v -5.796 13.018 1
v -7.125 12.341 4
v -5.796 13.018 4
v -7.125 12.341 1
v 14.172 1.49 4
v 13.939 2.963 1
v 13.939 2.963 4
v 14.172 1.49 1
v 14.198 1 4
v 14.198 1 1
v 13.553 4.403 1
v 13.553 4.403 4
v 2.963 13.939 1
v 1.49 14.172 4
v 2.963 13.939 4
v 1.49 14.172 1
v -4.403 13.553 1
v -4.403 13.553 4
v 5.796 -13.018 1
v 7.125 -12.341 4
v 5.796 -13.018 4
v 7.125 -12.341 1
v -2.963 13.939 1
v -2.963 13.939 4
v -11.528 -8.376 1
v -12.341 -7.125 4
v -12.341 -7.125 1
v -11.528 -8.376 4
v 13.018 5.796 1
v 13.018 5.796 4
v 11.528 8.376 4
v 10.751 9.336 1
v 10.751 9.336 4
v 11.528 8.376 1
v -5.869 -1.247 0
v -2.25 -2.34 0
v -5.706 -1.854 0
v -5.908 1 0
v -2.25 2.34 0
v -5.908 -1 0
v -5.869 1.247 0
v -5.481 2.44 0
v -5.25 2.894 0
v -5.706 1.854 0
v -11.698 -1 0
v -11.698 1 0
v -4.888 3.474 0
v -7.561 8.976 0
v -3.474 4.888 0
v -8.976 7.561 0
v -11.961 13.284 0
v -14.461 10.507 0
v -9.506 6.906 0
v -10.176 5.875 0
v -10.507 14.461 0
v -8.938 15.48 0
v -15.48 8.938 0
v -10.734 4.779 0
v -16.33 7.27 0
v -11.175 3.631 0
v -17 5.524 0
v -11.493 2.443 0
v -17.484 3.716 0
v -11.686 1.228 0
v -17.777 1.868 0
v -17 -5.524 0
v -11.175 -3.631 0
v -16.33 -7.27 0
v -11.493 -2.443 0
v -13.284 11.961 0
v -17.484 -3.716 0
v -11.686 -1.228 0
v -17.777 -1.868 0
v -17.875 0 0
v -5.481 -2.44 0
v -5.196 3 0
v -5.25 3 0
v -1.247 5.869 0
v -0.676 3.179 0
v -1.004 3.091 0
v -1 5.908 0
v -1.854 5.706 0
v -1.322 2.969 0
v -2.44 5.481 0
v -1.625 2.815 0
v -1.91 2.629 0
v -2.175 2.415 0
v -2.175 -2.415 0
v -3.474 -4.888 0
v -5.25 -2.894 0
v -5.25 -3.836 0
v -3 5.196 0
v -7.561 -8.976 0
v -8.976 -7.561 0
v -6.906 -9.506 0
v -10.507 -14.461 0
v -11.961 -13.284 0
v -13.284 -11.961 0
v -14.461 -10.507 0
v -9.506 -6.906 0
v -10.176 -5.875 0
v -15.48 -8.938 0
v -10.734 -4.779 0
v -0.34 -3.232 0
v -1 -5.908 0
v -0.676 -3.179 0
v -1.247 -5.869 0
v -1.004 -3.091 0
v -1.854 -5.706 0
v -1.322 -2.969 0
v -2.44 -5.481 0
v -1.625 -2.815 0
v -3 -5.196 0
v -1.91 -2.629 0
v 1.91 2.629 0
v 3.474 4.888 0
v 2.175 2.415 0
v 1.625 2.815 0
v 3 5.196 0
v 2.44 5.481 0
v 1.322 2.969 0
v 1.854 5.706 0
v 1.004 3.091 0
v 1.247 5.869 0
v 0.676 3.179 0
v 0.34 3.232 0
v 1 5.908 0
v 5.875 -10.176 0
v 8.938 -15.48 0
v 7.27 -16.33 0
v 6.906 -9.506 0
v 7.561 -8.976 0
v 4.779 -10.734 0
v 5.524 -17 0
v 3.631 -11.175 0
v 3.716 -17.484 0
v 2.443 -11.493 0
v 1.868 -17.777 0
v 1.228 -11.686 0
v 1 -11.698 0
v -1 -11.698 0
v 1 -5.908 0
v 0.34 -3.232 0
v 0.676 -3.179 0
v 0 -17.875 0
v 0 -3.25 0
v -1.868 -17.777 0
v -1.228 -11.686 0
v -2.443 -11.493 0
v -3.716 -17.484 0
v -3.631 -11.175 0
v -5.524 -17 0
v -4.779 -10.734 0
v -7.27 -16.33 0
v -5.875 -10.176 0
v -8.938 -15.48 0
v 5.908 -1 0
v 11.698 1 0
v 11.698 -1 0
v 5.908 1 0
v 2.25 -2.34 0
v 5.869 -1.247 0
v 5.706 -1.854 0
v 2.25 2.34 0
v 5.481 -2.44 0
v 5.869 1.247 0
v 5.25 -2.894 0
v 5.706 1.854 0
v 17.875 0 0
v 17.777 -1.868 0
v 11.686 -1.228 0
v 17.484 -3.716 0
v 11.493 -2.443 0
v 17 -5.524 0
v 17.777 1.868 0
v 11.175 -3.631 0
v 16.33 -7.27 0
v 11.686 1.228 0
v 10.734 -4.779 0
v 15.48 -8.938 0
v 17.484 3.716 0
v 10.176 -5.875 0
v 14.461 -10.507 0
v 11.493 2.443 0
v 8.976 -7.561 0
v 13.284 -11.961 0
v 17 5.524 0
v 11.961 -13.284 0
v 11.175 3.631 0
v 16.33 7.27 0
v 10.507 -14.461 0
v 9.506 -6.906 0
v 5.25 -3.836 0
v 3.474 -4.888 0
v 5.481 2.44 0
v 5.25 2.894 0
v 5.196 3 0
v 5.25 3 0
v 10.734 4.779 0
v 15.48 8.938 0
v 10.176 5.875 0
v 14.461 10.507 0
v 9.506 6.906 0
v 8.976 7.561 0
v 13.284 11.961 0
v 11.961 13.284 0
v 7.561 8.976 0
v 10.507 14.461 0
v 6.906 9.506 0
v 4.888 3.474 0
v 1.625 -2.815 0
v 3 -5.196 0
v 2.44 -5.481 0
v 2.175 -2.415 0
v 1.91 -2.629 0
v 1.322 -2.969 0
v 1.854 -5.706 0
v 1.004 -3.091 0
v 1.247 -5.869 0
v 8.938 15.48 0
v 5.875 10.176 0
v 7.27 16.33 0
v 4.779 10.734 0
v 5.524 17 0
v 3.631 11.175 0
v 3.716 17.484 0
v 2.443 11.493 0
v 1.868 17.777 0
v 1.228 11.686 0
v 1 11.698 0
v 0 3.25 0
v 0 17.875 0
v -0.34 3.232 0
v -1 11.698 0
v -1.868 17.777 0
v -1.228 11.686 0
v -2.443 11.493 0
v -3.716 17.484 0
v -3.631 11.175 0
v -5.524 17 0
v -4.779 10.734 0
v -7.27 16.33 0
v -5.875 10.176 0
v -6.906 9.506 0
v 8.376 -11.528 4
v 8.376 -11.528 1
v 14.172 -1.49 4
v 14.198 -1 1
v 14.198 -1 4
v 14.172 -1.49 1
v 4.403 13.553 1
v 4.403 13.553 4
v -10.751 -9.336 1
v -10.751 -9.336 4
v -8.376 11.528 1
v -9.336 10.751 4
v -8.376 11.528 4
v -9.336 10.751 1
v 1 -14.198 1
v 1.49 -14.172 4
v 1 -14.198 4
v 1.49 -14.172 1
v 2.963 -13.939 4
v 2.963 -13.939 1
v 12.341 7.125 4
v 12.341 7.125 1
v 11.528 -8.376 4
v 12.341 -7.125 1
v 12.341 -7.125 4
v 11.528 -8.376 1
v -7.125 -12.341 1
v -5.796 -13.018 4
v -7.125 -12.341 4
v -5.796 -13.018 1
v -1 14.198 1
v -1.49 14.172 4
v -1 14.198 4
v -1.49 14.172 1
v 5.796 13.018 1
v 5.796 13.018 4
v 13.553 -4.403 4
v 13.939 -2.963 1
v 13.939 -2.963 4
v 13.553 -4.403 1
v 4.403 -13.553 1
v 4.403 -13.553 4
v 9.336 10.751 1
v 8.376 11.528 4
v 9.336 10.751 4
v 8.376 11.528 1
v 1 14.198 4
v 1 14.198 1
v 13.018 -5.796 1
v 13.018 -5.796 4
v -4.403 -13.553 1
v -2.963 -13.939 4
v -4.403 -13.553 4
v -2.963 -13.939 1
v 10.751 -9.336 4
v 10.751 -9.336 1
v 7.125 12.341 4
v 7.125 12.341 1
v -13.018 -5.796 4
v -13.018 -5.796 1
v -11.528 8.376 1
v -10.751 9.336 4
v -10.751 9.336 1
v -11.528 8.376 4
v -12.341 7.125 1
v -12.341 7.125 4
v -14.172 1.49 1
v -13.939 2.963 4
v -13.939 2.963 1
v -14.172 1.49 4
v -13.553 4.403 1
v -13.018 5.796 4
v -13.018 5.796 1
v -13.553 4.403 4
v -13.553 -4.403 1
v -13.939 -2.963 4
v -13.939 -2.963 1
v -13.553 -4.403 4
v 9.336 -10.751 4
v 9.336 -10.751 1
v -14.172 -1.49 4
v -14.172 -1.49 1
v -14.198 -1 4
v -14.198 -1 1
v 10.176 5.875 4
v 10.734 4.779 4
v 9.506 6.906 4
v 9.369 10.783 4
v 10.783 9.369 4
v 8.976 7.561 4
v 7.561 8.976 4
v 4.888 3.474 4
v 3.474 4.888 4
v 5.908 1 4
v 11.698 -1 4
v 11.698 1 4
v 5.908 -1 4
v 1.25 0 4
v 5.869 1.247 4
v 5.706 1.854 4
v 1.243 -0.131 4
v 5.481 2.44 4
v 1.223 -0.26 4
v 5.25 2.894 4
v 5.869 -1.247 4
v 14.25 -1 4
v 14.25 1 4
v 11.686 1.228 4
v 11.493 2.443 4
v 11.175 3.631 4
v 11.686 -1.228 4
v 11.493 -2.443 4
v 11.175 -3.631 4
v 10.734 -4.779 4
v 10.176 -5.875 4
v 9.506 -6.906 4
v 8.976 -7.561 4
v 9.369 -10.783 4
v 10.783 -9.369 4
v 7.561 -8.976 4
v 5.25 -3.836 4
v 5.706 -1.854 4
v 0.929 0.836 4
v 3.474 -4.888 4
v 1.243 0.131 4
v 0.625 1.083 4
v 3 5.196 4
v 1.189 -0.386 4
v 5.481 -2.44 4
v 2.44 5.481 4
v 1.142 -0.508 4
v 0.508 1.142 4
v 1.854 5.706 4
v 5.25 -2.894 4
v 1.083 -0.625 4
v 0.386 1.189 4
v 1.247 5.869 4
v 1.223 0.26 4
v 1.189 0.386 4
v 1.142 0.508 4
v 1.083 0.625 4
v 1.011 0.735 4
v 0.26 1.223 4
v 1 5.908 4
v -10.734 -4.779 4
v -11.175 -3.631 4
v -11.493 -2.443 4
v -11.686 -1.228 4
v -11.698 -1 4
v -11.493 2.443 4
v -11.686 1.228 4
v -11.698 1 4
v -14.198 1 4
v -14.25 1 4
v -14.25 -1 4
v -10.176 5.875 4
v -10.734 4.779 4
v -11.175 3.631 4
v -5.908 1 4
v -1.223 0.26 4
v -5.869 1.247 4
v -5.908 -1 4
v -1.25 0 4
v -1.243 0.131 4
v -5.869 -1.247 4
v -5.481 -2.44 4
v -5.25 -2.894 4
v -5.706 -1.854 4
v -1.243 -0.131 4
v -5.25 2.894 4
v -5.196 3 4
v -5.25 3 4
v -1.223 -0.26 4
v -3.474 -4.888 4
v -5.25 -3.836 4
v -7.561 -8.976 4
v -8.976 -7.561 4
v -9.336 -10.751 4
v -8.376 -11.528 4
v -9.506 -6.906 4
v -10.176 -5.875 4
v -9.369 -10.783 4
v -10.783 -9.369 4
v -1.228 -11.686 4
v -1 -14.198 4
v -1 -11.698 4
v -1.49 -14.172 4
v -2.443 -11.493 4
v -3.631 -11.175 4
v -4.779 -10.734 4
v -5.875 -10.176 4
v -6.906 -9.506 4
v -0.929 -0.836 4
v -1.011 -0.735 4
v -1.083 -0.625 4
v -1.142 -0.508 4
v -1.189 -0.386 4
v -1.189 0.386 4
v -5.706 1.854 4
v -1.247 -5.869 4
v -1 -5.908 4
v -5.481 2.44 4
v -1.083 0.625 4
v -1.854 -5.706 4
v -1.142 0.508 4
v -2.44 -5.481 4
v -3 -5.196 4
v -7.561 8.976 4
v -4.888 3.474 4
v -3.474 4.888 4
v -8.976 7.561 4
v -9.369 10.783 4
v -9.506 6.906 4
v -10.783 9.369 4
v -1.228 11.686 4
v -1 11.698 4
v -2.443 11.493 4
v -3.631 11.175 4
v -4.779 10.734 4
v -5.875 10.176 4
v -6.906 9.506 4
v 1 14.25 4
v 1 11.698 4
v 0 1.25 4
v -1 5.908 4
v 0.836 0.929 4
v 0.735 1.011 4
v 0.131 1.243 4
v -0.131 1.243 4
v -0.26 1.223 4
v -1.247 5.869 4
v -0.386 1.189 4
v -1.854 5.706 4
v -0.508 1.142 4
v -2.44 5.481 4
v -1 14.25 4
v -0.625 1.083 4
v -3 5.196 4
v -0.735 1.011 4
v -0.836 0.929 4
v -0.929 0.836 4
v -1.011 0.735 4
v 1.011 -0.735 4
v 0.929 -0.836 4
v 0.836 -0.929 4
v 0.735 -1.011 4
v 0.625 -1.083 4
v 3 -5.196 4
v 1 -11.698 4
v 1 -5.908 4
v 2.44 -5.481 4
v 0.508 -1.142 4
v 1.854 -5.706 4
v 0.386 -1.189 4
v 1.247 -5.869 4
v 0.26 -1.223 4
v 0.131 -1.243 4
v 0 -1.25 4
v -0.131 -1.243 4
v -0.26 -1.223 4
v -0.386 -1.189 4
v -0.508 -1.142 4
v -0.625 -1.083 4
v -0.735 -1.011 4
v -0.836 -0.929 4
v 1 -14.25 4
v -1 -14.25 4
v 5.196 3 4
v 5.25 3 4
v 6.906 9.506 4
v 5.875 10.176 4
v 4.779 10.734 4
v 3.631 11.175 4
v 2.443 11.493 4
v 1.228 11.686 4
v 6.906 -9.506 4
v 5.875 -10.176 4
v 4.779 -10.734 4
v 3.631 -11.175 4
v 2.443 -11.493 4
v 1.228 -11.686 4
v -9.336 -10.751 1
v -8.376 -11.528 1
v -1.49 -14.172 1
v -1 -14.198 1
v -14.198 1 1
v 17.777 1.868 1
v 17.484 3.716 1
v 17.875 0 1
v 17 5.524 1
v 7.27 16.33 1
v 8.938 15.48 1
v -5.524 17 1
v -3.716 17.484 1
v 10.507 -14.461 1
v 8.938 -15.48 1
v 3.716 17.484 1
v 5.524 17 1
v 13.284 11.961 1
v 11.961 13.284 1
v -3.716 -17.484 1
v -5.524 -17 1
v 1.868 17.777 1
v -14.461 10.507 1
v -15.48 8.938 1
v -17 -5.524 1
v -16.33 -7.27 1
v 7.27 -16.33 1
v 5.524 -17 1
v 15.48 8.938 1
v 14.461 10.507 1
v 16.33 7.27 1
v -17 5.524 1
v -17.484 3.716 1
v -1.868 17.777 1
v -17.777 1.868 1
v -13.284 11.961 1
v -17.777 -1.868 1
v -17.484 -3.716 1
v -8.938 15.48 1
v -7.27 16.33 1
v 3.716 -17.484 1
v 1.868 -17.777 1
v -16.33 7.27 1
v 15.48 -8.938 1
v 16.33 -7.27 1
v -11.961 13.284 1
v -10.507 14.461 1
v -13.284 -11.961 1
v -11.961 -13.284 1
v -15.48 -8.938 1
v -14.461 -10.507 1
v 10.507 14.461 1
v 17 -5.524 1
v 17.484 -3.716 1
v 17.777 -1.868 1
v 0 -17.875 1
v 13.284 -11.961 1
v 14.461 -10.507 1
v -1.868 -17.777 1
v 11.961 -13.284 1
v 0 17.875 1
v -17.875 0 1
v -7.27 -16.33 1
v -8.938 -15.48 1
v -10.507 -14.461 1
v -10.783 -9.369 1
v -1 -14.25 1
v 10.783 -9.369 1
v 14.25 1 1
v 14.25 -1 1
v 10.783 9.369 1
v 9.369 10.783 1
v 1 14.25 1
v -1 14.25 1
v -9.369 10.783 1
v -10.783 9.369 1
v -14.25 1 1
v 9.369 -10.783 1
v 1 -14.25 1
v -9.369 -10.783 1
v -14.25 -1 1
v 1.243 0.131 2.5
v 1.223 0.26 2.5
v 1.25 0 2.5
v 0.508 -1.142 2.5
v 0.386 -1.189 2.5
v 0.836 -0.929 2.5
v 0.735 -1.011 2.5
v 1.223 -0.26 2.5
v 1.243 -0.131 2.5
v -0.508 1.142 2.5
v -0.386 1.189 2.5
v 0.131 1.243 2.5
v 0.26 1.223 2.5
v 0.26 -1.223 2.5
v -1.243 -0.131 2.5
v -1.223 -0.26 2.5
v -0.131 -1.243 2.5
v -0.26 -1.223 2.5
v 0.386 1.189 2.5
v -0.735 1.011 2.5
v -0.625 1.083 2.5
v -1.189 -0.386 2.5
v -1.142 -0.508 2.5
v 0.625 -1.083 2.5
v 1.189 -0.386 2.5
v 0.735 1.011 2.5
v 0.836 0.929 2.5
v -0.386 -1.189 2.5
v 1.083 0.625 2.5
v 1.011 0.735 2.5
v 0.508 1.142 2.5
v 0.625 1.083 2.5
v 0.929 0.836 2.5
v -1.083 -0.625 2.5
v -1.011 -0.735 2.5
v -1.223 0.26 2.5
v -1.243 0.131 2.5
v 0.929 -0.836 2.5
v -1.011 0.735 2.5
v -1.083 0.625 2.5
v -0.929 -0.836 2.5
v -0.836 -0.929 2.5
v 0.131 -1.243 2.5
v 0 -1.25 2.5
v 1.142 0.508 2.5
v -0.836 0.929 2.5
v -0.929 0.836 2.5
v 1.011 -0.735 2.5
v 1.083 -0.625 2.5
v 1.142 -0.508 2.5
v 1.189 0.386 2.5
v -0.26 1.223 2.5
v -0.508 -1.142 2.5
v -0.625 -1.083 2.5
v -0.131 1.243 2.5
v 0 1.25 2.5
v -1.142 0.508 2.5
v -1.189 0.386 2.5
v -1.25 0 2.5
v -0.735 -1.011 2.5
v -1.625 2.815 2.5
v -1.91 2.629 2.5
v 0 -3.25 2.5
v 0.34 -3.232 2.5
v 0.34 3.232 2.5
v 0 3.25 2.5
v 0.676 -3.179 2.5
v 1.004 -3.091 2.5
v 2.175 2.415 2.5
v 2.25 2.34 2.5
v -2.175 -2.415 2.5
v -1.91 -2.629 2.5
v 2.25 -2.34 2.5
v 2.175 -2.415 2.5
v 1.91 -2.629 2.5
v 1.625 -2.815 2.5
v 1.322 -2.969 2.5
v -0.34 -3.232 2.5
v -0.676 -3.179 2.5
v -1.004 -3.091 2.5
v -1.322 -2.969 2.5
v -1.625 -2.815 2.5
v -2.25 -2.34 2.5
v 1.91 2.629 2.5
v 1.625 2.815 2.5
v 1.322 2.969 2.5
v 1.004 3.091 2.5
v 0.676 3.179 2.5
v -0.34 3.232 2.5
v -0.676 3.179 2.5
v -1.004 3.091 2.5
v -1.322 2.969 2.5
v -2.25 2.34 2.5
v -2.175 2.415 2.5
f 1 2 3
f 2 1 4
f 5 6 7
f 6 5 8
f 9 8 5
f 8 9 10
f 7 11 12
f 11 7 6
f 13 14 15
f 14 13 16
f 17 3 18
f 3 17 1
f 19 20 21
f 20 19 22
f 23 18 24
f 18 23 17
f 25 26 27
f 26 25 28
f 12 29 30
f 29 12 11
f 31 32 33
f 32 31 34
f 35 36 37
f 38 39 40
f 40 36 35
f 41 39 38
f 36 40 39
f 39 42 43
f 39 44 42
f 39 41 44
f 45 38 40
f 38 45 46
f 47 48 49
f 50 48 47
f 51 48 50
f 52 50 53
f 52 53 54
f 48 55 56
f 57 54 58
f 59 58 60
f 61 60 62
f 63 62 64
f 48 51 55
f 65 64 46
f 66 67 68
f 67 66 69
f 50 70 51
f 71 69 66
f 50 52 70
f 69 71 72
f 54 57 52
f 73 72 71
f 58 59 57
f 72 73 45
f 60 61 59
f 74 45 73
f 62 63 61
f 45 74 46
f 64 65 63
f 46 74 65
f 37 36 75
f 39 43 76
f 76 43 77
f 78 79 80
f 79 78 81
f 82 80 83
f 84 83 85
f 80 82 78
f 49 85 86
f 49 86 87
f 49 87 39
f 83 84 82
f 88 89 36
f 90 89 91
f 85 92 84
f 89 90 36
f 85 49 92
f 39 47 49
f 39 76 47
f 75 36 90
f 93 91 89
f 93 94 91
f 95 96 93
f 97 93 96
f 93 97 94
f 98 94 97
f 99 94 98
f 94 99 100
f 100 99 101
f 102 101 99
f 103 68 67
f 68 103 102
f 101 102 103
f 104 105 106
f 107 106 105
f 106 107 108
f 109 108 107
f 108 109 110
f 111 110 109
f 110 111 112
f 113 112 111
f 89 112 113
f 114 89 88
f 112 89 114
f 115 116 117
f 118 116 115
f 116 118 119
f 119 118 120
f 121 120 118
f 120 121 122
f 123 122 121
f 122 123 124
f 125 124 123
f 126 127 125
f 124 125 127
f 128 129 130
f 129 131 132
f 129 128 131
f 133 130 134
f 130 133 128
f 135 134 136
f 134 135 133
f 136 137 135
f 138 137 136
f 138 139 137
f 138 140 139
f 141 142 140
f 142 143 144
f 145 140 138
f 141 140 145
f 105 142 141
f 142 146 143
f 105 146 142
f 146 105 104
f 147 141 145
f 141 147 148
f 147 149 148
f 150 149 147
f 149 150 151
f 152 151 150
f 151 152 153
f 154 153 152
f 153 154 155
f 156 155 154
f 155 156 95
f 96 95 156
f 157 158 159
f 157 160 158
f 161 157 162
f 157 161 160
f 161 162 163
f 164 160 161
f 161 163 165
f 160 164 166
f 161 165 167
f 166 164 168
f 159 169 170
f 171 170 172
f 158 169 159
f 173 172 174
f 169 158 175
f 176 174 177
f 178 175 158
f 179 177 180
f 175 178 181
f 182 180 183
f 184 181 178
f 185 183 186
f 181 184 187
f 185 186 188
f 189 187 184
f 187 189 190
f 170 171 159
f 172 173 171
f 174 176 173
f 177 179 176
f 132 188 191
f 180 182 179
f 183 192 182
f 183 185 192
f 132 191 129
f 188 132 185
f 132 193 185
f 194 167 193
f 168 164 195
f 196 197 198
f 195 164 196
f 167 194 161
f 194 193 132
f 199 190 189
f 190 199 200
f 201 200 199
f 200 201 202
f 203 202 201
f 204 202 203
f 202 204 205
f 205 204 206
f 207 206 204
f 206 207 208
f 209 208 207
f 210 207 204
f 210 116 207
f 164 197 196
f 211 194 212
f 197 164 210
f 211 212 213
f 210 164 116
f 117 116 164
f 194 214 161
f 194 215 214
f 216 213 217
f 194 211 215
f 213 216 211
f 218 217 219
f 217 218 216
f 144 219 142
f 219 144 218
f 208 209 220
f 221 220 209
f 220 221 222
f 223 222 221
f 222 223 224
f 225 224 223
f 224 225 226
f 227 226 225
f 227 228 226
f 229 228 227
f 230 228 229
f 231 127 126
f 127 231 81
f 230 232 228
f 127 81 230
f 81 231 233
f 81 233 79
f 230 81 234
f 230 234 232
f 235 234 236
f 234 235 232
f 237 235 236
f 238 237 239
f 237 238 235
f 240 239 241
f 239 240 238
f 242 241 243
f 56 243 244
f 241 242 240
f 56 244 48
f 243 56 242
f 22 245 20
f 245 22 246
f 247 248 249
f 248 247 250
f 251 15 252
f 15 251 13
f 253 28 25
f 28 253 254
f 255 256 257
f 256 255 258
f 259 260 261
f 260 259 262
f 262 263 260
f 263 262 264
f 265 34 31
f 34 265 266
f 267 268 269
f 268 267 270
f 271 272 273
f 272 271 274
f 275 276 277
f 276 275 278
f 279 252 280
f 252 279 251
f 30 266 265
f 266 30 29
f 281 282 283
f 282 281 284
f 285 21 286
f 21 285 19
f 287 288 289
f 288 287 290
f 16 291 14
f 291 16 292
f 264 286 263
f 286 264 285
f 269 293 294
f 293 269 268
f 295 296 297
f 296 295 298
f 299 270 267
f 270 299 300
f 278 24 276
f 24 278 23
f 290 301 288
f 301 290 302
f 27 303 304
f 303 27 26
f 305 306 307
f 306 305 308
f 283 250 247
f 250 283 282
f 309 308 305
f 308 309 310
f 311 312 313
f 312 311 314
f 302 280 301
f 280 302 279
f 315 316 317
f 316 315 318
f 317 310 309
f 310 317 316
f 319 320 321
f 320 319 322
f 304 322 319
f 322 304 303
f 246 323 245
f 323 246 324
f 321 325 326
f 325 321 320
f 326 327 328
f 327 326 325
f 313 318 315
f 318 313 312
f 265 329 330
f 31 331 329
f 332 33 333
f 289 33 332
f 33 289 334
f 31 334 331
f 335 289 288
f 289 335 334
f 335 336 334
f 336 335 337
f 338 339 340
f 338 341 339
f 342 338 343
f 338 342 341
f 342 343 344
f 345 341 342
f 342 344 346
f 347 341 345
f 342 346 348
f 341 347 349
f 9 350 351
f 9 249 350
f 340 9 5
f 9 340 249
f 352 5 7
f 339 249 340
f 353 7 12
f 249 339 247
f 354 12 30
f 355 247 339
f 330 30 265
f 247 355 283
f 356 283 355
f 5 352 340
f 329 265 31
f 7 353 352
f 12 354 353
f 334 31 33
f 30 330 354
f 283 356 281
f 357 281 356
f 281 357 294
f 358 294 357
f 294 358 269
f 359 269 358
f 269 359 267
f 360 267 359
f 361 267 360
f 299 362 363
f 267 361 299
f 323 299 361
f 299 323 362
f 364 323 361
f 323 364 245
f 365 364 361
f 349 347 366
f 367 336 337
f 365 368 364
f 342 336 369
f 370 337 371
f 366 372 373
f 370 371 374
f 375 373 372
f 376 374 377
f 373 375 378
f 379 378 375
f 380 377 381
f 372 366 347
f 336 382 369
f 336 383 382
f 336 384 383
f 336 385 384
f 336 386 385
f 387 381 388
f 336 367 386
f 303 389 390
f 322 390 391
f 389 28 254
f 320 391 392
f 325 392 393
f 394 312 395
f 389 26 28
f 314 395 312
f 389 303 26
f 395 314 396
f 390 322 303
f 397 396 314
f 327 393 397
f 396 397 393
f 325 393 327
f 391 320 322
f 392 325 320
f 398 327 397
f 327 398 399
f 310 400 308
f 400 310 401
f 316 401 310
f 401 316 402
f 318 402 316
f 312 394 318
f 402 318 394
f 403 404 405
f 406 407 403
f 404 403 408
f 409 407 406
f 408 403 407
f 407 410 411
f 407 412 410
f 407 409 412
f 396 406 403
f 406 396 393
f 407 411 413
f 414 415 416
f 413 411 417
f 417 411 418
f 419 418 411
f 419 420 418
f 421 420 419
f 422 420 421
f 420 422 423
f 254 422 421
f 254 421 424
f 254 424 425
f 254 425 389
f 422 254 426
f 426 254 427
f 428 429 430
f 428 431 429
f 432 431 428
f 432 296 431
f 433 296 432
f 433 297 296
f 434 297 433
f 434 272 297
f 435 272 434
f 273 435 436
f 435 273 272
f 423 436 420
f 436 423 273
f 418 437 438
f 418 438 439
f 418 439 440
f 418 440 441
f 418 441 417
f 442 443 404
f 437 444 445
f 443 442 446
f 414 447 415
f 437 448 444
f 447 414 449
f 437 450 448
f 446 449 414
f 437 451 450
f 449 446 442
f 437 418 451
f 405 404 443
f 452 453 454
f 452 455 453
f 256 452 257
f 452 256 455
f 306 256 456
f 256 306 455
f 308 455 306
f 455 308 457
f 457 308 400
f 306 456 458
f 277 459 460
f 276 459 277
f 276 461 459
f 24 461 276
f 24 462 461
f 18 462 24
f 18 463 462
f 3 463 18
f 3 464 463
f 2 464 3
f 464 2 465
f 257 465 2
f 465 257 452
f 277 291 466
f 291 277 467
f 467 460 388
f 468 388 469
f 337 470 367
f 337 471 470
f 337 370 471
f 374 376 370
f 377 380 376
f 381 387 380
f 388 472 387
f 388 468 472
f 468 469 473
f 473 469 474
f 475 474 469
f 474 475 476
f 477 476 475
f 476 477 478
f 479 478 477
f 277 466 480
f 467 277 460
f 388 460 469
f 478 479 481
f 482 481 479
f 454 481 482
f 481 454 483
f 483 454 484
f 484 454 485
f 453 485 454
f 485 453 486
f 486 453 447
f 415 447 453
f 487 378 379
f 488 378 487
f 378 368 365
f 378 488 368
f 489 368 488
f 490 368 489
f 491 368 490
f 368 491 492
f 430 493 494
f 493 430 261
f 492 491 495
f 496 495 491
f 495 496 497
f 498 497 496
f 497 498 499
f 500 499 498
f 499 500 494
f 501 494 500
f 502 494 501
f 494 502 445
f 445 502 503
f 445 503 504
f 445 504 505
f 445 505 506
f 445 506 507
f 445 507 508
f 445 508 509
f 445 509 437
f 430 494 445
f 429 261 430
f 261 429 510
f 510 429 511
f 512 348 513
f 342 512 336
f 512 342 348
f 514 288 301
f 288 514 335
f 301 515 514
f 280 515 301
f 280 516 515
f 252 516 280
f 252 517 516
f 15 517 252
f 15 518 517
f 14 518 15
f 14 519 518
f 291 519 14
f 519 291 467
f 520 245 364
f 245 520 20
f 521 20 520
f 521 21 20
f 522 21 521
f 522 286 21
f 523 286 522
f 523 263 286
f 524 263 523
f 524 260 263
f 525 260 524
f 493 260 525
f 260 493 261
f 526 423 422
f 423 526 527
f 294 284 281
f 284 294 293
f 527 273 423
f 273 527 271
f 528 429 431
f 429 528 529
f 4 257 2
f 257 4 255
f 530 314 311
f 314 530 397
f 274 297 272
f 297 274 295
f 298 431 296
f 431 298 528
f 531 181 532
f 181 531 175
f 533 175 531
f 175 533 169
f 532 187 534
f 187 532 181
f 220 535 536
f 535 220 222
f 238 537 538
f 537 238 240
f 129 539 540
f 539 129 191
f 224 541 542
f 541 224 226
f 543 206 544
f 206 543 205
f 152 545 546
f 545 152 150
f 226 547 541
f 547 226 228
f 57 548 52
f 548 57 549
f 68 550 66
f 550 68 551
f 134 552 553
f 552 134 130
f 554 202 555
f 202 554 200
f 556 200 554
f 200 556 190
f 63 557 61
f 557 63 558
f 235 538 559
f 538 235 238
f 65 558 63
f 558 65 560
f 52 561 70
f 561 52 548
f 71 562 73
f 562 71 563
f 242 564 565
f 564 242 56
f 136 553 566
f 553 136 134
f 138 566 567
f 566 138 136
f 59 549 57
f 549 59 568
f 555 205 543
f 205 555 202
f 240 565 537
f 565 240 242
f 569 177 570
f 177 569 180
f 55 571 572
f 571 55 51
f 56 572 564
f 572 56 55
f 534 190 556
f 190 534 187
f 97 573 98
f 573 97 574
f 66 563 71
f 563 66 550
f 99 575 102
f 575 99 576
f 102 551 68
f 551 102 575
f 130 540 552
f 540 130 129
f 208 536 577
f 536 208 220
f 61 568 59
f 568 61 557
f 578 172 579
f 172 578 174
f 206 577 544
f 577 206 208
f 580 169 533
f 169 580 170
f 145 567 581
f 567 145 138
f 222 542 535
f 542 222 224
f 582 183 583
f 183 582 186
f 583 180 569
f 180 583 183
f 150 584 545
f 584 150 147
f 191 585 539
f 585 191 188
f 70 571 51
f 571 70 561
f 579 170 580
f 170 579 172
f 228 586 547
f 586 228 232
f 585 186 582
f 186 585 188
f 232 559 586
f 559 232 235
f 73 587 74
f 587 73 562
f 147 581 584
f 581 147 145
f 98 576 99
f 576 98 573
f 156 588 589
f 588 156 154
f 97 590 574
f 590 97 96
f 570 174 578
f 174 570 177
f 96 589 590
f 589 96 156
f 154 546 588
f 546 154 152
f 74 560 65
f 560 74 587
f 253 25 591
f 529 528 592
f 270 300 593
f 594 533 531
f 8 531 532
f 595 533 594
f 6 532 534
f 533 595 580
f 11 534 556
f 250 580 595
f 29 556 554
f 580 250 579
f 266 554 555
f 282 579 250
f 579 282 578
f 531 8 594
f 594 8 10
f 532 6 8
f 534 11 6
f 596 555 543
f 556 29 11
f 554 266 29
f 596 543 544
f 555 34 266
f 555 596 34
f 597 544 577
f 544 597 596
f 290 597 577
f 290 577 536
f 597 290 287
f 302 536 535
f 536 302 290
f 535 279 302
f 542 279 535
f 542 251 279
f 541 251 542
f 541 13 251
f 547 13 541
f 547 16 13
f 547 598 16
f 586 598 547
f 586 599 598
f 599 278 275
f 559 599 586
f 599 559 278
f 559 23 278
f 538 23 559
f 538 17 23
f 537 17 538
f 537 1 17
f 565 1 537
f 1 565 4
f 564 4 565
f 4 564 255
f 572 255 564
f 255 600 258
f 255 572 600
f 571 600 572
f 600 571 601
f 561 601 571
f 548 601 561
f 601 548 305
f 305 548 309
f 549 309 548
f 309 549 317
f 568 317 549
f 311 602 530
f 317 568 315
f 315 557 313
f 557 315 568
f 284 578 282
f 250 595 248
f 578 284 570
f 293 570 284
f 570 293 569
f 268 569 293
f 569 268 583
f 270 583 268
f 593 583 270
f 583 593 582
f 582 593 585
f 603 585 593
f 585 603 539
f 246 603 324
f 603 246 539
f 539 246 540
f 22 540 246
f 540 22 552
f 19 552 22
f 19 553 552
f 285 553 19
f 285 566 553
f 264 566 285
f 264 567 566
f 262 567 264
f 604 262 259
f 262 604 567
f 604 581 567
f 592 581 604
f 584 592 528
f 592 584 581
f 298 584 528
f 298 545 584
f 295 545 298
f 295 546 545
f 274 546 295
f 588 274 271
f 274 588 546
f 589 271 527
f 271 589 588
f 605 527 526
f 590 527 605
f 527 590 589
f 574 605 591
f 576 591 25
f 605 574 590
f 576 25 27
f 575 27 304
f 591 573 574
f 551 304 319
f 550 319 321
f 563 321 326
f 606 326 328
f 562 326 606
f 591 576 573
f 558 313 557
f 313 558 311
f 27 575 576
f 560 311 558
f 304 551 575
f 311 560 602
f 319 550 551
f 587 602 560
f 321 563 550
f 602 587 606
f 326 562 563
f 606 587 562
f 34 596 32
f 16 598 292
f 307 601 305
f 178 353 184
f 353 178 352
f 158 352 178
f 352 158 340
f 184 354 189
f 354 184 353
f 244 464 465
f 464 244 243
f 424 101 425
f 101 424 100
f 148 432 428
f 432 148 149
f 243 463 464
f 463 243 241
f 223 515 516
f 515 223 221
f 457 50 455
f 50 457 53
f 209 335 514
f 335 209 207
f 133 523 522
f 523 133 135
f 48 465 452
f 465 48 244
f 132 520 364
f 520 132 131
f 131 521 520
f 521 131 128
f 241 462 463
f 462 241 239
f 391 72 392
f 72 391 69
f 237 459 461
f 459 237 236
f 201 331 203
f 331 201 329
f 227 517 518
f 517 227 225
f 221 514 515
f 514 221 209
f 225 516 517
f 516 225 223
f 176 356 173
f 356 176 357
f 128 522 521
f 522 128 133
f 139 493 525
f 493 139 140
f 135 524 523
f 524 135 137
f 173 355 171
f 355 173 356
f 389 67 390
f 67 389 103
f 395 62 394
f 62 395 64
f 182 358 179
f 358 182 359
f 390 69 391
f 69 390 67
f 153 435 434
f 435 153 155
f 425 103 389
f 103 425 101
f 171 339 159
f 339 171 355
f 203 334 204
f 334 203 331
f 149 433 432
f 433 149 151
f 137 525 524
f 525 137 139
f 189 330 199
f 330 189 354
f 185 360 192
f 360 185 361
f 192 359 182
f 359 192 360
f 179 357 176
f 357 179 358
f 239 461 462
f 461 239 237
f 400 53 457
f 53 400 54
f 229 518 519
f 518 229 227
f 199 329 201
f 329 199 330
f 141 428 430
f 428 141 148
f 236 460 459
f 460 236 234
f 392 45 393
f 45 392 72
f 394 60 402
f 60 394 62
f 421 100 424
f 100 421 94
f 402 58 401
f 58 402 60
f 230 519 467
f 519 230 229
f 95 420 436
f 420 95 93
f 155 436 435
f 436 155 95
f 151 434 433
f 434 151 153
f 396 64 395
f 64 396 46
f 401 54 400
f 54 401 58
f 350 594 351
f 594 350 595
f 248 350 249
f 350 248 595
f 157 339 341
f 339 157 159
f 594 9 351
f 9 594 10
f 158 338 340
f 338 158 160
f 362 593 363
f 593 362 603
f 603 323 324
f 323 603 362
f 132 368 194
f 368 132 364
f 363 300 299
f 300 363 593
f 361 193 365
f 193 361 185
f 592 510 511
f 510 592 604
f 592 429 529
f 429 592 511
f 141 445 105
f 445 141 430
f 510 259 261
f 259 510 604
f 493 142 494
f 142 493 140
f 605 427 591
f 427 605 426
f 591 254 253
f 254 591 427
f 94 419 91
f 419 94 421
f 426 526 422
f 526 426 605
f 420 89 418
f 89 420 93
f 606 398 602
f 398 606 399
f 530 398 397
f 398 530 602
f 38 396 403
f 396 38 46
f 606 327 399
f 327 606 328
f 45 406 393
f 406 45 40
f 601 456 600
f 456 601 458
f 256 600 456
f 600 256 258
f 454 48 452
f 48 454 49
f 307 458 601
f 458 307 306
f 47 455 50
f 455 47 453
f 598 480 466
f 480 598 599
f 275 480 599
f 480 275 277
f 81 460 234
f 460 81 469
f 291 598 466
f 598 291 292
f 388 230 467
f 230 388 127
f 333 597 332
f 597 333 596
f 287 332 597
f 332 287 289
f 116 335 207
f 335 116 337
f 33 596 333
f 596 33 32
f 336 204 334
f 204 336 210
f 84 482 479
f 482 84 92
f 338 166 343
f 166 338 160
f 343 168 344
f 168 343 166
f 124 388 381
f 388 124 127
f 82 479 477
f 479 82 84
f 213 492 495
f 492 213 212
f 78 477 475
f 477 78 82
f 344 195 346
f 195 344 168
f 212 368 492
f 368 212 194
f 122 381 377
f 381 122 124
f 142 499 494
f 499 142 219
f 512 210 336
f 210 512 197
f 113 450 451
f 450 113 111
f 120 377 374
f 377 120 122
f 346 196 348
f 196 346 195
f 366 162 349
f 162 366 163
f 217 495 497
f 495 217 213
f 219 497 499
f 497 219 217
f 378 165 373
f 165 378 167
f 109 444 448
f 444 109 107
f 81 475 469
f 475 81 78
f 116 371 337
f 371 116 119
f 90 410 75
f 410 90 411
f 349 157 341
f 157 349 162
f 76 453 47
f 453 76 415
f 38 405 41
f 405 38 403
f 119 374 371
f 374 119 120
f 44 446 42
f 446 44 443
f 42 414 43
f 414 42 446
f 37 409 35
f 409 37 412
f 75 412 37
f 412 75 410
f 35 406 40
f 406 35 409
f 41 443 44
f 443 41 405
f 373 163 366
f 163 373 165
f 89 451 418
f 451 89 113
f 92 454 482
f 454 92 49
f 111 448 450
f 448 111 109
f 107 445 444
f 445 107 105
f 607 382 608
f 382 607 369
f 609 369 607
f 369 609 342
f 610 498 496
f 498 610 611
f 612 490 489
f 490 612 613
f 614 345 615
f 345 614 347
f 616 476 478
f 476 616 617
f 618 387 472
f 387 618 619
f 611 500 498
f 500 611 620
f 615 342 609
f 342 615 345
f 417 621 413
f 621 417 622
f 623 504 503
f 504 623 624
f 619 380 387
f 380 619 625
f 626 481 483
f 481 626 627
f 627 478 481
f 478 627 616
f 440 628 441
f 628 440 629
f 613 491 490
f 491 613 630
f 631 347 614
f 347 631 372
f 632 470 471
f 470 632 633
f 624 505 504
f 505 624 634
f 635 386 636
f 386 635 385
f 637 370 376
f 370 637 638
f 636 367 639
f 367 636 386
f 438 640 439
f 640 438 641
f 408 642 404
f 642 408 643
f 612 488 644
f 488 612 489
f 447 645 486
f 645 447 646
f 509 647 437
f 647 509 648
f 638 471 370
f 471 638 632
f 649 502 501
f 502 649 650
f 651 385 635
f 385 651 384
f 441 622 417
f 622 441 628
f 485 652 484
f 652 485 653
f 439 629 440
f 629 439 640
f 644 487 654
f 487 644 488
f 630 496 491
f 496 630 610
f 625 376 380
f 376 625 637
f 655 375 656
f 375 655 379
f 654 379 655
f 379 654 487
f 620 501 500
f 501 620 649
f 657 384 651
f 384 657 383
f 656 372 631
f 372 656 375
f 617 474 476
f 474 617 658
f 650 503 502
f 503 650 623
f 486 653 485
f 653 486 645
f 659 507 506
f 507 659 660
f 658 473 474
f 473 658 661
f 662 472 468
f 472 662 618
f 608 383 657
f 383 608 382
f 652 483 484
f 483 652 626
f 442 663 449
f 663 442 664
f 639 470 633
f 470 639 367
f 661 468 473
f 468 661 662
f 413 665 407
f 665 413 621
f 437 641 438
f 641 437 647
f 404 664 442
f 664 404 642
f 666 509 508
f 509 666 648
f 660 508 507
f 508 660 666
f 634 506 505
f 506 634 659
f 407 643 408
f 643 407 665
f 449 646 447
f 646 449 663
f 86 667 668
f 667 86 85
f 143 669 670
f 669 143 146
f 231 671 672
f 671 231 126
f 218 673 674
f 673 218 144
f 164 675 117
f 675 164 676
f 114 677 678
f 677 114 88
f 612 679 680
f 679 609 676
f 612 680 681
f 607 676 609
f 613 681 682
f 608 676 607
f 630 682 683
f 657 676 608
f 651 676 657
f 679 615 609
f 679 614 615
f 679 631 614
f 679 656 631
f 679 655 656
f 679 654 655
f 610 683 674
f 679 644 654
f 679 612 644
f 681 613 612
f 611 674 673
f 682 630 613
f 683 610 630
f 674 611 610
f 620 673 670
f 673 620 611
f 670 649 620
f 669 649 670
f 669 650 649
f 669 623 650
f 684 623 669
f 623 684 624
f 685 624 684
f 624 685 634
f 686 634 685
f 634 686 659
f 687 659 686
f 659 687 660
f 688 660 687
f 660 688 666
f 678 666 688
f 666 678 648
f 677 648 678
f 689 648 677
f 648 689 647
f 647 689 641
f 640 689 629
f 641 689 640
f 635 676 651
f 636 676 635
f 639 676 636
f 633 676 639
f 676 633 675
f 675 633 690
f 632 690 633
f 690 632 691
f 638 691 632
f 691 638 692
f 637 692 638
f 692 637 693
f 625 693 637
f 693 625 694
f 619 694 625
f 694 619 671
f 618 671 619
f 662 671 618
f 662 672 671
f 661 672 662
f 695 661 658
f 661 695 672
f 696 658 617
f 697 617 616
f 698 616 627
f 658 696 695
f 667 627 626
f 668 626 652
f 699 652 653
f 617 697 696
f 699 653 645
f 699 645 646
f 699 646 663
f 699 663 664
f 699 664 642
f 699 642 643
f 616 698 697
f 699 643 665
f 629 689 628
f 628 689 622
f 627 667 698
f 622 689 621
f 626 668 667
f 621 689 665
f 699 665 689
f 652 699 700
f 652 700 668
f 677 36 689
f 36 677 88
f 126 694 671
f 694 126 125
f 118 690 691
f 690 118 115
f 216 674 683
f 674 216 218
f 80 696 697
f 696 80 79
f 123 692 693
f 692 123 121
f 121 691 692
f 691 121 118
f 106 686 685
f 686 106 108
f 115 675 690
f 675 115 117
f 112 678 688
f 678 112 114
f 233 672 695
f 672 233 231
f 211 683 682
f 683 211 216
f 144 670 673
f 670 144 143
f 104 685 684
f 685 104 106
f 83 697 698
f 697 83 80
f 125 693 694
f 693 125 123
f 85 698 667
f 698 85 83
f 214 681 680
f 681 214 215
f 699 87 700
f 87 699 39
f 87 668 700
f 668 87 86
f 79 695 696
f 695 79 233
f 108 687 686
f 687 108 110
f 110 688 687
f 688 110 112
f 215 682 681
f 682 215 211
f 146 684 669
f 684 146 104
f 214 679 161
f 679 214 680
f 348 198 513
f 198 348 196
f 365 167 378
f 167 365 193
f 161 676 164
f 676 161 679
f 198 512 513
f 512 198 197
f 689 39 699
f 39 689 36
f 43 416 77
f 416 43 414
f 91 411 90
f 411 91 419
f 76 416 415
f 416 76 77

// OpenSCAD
// Eisenbahn
//

rad=true;
schiene = false;
aufhangung = false;
rad_aufhang= false;
motor = false;
achse = false;
achsen_verschluss = false;
wagon_achse = false;
wagon = false;

antrieb=false;
zug = false;

/* [Eisenbahnrad] */
// [Radhöhe]
rh = 4;         
// [Steghöhe]
sh = 1;
// [Raddurchmesser]
rd = 28.5;
// [Stegdurchmesser]
sd = 35.75;

/* [Eisenbahnschiene] */
// [Schienenlänge]
sl = 150;
// [Schienenweite]
sw = 35;
// [Schienenstegabstand]
ssa = 30;
// [Stegbreite]
sb = sw+20;

/* [Lokaufhängung] */
// [Aufhängungslänge]
ahl = 45;         

/* [Motor] */
// [Motorlänge]
        

if (antrieb) {
    antrieb();
}
else if(zug){
    translate([60,0,0])
    //rotate([0,0,-15])
    antrieb();
    translate([190,0,0])
    //rotate([0,0,15])
    antrieb();
    
    if(wagon) wagon();
} else {

    if (rad) rad();
    if (aufhangung) aufhangung();
    if (rad_aufhang) rad_aufhang();
    if (achse) achse();
    if (achsen_verschluss) achsen_verschluss();
    if (wagon_achse) wagon_achse();
    if (wagon) wagon();
}

module rad() {

    $fn = 60;
    
    // Radreifen
    difference() {
        union() {
            cylinder(h=rh, d=rd);
            cylinder(h=sh, d=sd);
        }
        translate([0,0,-0.5])
        cylinder(h=rh+1, d=rd-5);
    }
    
    // Speichen
    difference() {
        union() {
            cylinder(h=rh, d=12);
        
            for (i = [0:45:360]) {
                rotate([i,90,0])
                translate([-rh,-1,0])
                cube([rh,2,rd/2]);
            }
        
        }
        translate([0,0,-0.5])
        cylinder(h=rh+1, d=2.5);
               
        
        translate([0,0,-2])
        translate([0,0,-0.5])
        cylinder(h=rh+1, d=6.5);
               
    }
    translate([2.25,-4,0])
    cube([3,7,rh]);
    
    translate([-5.25,-4,0])
    cube([3,7,rh]);
    
}


module schiene() {

    translate([0,-sw/2-2,0])
    cube ([sl,4,5], center=true);
    translate([0,sw/2+2,0])
    cube ([sl,4,5], center=true);
    
    
    for (i = [-sl/2+ssa/2:ssa:sl/2]) {
        translate([i,0,-1.5])
        cube([5,sb,2], center=true);
    }
    
    

}


module aufhangung() {
    $fn = 60;

    rotate([90,0,0])
    union() {
        /*
        difference() {
            translate([ahl/2,0,0])
            #cube([ahl,8,3], center=true);
            
            translate([ahl-5,0,-2])
            cylinder(d=6.5, h=5);
            
            translate([9.5,-5.0,-0.5])
            cube([24.5,10,10,]);
        }*/    
        
        difference() {
            translate([0,0,-1])
            cube([5,25,5], center=true);
            
            translate([0,20,-1])
            rotate([90,0,0])
            cylinder(d=2, h= 40);
        }
        
        translate([0,9,-1.5])
        cylinder(d=3,h=8);
        
        
        translate([0,-9,-1.5])
        cylinder(d=3,h=8);

    }      
}


module motor() {
    $fn = 60;
    color("green")
    rotate([90,0,90])
    union() {    
            translate([-1,0,0])
            difference() {

            cylinder(d=20, h=28);
            translate([10,0,14])
            cube([3,25,30],center=true);
            translate([-10,0,14])
            cube([3,25,30],center=true);
            
        }
        
        translate([-1,-5,4])
        cube([11,10,24]);
        translate([-12,-5,4])
        cube([11,10,24]);
        
        difference() {
            translate([0,0,-37/2])
            cube([19,23,37],center=true);
            
            translate([-20,9,-5.5])
            rotate([0,90,0])
            cylinder(d=3, h=40);
            
            translate([-20,-9,-5.5])
            rotate([0,90,0])
            cylinder(d=3, h=40);
        }
        
        translate([-37/2,0,-25])
        rotate([0,90,0])
        cylinder(d=6, h=37);
    }
}


module achse() {
    $fn = 60;
    
    translate([0,37/2,0])
    rotate([90,0,0])
    union() {
        difference() {
            cylinder(d=6, h=37);
            
            translate([2,-4,-1])
            cube([3,7,rh]);
            translate([-5,-4,-1])
            cube([3,7,rh]);
            
            translate([2,-4,35-1])
            cube([3,7,rh]);
            translate([-5,-4,35-1])
            cube([3,7,rh]);
            
            
            translate([0,0,-5])
            cylinder(d=2, h = 50);
        }
        
    }
}

module wagon_achse(kurz_version= true){
    
    difference(){
        
        union(){
            
            hull(){
                translate([-4,-17,0])
                cube([8,34,5]);
                
                translate([-38,-3,0])
                cube([8,6,1]);
                
                translate([50,-3,0])
                cube([8,6,1]);
            }
            
            translate([10.5,0,0])
            cylinder(r=10, h= 7);
            translate([10.5,0,0])
            cylinder(r=6, h= 10.5);
            
        }
        
        //radkasten
        translate([-20,-21.5,0])
        cylinder(r=15, h= 20, center=true);
        translate([-20,21.5,0])
        cylinder(r=15, h= 20, center=true);
        translate([27,-25.5,0])
        cylinder(r=20, h= 20, center=true);
        translate([27,25.5,0])
        cylinder(r=20, h= 20, center=true);
        
        // m3 schrauben versenkt
        translate([0,-13,0])
        cylinder(d=3, h= 20, center= true, $fn = 12);
        translate([0,13,0])
        cylinder(d=3, h= 20, center= true, $fn = 12);
        translate([0,-13,2])
        cylinder(d=6, h= 20, center= false, $fn = 12);
        translate([0,13,2])
        cylinder(d=6, h= 20, center= false, $fn = 12);
        
        // schraube für den wagon
        translate([10.5,0,0])
        cylinder(d=3, h= 40, center=true, $fn= 12);
        
        // aussparung für kabel
        cube([20,16,5], center= true);
        translate([8,0,0])
        cube([58,8,5], center= true);
        translate([10.5,3.5,0])
        cube([4,3,40], center=true);
        translate([10.5,-3.5,0])
        cube([4,3,40], center=true);
        
        // befestigung vorne /hinten
        translate([-35,0,0])
        cylinder(d=3, h= 20, center= true, $fn = 12);
        translate([55,0,0])
        cylinder(d=3, h= 20, center= true, $fn = 12);
        
        if(kurz_version){
            translate([-50,-25,-3])
            cube([40,50,10]);
        }
        
        hull(){
            translate([40,7,0])
            cylinder(r=4, h= 4, center = true);
            translate([40,-7,0])
            cylinder(r=4, h= 4, center = true);
        }
        
        translate([40,0,0])
        cylinder(d=3, h= 20, center = true, $fn=12);
    }
    
    difference(){
        hull(){
            translate([40,7,0])
            cylinder(r=7, h= 4);
            translate([40,-7,0])
            cylinder(r=7, h= 4);
        }
        
        hull(){
            translate([40,7,0])
            cylinder(r=3, h= 4, center = true);
            translate([40,-7,0])
            cylinder(r=3, h= 4, center = true);
        }
        
        translate([40,0,0])
        cylinder(d=3, h= 20, center = true, $fn = 12);
    }
}

module rad_aufhang(){
    translate([-5.5,0,12.5])
    difference() {
        cylinder(r=3, h=1.75, $fn=100);
        cylinder(r=1.5, h=7.5, $fn=100, center = true);
    }
    
    translate([-10,-10,-4.5])
    difference() {
        cube([10,20,17]);
        translate([-0.5,5,-0.5])
        cube([11,10,15.5]);
        translate([5,27,4.5])
        rotate([90,0,0])
        cylinder(d=6.25, h=37, $fn=100);
        translate([3,-5,-0.5])
        cube([4,30,2.5]);
    }
}

module antrieb(){
    translate([-5.5,0,0])
    union(){
        if (rad) {
            translate([-25,-35/2+1,0])
            rotate([90,0,0]) rad();
            translate([-25,35/2-1,0])
            rotate([-90,0,0]) rad();
            
            translate([35,35/2-1,0])
            rotate([-90,0,0]) rad();
            translate([35,-35/2+1,0])
            rotate([90,0,0]) rad();
        }

        if (aufhangung) {
            
            translate([-5.5,11,0])
            aufhangung();
            
            translate([-5.5,-11,0])
            rotate([-180,0,0]) aufhangung();
            
        }
        
        if (rad_aufhang){
           translate([40,0,0])
           rad_aufhang();
        }

        if (achse) {
            translate([35,0,0])
            achse();
        }
        
        if (wagon_achse){
            translate([-5.5,0,12.5])
            wagon_achse();
        }

        if (schiene) translate ([0,0,-17.5]) schiene();
        if (motor) motor();
    }
}

module wagon(){
    color("lightgrey")
    translate([40,-12,20])
    difference(){
        cube([170,24,2]);
        //translate([2,2,2])
        //cube([250-4,70-4,60]);
        
        translate([20,12,0])
        cylinder(r= 7, h = 50, center=true);
        
        translate([150,12,0])
        cylinder(r= 7, h = 50, center=true);
    };
}

module achsen_verschluss(){
    
    difference(){
        cylinder(r=9, h= 1);
        
        translate([0,0,0])
        cylinder(d=3, h= 40, center=true, $fn= 12);
        
        translate([0,3.5,0])
        cube([4,3,40], center=true);
        translate([0,-3.5,0])
        cube([4,3,40], center=true);
    }

}
